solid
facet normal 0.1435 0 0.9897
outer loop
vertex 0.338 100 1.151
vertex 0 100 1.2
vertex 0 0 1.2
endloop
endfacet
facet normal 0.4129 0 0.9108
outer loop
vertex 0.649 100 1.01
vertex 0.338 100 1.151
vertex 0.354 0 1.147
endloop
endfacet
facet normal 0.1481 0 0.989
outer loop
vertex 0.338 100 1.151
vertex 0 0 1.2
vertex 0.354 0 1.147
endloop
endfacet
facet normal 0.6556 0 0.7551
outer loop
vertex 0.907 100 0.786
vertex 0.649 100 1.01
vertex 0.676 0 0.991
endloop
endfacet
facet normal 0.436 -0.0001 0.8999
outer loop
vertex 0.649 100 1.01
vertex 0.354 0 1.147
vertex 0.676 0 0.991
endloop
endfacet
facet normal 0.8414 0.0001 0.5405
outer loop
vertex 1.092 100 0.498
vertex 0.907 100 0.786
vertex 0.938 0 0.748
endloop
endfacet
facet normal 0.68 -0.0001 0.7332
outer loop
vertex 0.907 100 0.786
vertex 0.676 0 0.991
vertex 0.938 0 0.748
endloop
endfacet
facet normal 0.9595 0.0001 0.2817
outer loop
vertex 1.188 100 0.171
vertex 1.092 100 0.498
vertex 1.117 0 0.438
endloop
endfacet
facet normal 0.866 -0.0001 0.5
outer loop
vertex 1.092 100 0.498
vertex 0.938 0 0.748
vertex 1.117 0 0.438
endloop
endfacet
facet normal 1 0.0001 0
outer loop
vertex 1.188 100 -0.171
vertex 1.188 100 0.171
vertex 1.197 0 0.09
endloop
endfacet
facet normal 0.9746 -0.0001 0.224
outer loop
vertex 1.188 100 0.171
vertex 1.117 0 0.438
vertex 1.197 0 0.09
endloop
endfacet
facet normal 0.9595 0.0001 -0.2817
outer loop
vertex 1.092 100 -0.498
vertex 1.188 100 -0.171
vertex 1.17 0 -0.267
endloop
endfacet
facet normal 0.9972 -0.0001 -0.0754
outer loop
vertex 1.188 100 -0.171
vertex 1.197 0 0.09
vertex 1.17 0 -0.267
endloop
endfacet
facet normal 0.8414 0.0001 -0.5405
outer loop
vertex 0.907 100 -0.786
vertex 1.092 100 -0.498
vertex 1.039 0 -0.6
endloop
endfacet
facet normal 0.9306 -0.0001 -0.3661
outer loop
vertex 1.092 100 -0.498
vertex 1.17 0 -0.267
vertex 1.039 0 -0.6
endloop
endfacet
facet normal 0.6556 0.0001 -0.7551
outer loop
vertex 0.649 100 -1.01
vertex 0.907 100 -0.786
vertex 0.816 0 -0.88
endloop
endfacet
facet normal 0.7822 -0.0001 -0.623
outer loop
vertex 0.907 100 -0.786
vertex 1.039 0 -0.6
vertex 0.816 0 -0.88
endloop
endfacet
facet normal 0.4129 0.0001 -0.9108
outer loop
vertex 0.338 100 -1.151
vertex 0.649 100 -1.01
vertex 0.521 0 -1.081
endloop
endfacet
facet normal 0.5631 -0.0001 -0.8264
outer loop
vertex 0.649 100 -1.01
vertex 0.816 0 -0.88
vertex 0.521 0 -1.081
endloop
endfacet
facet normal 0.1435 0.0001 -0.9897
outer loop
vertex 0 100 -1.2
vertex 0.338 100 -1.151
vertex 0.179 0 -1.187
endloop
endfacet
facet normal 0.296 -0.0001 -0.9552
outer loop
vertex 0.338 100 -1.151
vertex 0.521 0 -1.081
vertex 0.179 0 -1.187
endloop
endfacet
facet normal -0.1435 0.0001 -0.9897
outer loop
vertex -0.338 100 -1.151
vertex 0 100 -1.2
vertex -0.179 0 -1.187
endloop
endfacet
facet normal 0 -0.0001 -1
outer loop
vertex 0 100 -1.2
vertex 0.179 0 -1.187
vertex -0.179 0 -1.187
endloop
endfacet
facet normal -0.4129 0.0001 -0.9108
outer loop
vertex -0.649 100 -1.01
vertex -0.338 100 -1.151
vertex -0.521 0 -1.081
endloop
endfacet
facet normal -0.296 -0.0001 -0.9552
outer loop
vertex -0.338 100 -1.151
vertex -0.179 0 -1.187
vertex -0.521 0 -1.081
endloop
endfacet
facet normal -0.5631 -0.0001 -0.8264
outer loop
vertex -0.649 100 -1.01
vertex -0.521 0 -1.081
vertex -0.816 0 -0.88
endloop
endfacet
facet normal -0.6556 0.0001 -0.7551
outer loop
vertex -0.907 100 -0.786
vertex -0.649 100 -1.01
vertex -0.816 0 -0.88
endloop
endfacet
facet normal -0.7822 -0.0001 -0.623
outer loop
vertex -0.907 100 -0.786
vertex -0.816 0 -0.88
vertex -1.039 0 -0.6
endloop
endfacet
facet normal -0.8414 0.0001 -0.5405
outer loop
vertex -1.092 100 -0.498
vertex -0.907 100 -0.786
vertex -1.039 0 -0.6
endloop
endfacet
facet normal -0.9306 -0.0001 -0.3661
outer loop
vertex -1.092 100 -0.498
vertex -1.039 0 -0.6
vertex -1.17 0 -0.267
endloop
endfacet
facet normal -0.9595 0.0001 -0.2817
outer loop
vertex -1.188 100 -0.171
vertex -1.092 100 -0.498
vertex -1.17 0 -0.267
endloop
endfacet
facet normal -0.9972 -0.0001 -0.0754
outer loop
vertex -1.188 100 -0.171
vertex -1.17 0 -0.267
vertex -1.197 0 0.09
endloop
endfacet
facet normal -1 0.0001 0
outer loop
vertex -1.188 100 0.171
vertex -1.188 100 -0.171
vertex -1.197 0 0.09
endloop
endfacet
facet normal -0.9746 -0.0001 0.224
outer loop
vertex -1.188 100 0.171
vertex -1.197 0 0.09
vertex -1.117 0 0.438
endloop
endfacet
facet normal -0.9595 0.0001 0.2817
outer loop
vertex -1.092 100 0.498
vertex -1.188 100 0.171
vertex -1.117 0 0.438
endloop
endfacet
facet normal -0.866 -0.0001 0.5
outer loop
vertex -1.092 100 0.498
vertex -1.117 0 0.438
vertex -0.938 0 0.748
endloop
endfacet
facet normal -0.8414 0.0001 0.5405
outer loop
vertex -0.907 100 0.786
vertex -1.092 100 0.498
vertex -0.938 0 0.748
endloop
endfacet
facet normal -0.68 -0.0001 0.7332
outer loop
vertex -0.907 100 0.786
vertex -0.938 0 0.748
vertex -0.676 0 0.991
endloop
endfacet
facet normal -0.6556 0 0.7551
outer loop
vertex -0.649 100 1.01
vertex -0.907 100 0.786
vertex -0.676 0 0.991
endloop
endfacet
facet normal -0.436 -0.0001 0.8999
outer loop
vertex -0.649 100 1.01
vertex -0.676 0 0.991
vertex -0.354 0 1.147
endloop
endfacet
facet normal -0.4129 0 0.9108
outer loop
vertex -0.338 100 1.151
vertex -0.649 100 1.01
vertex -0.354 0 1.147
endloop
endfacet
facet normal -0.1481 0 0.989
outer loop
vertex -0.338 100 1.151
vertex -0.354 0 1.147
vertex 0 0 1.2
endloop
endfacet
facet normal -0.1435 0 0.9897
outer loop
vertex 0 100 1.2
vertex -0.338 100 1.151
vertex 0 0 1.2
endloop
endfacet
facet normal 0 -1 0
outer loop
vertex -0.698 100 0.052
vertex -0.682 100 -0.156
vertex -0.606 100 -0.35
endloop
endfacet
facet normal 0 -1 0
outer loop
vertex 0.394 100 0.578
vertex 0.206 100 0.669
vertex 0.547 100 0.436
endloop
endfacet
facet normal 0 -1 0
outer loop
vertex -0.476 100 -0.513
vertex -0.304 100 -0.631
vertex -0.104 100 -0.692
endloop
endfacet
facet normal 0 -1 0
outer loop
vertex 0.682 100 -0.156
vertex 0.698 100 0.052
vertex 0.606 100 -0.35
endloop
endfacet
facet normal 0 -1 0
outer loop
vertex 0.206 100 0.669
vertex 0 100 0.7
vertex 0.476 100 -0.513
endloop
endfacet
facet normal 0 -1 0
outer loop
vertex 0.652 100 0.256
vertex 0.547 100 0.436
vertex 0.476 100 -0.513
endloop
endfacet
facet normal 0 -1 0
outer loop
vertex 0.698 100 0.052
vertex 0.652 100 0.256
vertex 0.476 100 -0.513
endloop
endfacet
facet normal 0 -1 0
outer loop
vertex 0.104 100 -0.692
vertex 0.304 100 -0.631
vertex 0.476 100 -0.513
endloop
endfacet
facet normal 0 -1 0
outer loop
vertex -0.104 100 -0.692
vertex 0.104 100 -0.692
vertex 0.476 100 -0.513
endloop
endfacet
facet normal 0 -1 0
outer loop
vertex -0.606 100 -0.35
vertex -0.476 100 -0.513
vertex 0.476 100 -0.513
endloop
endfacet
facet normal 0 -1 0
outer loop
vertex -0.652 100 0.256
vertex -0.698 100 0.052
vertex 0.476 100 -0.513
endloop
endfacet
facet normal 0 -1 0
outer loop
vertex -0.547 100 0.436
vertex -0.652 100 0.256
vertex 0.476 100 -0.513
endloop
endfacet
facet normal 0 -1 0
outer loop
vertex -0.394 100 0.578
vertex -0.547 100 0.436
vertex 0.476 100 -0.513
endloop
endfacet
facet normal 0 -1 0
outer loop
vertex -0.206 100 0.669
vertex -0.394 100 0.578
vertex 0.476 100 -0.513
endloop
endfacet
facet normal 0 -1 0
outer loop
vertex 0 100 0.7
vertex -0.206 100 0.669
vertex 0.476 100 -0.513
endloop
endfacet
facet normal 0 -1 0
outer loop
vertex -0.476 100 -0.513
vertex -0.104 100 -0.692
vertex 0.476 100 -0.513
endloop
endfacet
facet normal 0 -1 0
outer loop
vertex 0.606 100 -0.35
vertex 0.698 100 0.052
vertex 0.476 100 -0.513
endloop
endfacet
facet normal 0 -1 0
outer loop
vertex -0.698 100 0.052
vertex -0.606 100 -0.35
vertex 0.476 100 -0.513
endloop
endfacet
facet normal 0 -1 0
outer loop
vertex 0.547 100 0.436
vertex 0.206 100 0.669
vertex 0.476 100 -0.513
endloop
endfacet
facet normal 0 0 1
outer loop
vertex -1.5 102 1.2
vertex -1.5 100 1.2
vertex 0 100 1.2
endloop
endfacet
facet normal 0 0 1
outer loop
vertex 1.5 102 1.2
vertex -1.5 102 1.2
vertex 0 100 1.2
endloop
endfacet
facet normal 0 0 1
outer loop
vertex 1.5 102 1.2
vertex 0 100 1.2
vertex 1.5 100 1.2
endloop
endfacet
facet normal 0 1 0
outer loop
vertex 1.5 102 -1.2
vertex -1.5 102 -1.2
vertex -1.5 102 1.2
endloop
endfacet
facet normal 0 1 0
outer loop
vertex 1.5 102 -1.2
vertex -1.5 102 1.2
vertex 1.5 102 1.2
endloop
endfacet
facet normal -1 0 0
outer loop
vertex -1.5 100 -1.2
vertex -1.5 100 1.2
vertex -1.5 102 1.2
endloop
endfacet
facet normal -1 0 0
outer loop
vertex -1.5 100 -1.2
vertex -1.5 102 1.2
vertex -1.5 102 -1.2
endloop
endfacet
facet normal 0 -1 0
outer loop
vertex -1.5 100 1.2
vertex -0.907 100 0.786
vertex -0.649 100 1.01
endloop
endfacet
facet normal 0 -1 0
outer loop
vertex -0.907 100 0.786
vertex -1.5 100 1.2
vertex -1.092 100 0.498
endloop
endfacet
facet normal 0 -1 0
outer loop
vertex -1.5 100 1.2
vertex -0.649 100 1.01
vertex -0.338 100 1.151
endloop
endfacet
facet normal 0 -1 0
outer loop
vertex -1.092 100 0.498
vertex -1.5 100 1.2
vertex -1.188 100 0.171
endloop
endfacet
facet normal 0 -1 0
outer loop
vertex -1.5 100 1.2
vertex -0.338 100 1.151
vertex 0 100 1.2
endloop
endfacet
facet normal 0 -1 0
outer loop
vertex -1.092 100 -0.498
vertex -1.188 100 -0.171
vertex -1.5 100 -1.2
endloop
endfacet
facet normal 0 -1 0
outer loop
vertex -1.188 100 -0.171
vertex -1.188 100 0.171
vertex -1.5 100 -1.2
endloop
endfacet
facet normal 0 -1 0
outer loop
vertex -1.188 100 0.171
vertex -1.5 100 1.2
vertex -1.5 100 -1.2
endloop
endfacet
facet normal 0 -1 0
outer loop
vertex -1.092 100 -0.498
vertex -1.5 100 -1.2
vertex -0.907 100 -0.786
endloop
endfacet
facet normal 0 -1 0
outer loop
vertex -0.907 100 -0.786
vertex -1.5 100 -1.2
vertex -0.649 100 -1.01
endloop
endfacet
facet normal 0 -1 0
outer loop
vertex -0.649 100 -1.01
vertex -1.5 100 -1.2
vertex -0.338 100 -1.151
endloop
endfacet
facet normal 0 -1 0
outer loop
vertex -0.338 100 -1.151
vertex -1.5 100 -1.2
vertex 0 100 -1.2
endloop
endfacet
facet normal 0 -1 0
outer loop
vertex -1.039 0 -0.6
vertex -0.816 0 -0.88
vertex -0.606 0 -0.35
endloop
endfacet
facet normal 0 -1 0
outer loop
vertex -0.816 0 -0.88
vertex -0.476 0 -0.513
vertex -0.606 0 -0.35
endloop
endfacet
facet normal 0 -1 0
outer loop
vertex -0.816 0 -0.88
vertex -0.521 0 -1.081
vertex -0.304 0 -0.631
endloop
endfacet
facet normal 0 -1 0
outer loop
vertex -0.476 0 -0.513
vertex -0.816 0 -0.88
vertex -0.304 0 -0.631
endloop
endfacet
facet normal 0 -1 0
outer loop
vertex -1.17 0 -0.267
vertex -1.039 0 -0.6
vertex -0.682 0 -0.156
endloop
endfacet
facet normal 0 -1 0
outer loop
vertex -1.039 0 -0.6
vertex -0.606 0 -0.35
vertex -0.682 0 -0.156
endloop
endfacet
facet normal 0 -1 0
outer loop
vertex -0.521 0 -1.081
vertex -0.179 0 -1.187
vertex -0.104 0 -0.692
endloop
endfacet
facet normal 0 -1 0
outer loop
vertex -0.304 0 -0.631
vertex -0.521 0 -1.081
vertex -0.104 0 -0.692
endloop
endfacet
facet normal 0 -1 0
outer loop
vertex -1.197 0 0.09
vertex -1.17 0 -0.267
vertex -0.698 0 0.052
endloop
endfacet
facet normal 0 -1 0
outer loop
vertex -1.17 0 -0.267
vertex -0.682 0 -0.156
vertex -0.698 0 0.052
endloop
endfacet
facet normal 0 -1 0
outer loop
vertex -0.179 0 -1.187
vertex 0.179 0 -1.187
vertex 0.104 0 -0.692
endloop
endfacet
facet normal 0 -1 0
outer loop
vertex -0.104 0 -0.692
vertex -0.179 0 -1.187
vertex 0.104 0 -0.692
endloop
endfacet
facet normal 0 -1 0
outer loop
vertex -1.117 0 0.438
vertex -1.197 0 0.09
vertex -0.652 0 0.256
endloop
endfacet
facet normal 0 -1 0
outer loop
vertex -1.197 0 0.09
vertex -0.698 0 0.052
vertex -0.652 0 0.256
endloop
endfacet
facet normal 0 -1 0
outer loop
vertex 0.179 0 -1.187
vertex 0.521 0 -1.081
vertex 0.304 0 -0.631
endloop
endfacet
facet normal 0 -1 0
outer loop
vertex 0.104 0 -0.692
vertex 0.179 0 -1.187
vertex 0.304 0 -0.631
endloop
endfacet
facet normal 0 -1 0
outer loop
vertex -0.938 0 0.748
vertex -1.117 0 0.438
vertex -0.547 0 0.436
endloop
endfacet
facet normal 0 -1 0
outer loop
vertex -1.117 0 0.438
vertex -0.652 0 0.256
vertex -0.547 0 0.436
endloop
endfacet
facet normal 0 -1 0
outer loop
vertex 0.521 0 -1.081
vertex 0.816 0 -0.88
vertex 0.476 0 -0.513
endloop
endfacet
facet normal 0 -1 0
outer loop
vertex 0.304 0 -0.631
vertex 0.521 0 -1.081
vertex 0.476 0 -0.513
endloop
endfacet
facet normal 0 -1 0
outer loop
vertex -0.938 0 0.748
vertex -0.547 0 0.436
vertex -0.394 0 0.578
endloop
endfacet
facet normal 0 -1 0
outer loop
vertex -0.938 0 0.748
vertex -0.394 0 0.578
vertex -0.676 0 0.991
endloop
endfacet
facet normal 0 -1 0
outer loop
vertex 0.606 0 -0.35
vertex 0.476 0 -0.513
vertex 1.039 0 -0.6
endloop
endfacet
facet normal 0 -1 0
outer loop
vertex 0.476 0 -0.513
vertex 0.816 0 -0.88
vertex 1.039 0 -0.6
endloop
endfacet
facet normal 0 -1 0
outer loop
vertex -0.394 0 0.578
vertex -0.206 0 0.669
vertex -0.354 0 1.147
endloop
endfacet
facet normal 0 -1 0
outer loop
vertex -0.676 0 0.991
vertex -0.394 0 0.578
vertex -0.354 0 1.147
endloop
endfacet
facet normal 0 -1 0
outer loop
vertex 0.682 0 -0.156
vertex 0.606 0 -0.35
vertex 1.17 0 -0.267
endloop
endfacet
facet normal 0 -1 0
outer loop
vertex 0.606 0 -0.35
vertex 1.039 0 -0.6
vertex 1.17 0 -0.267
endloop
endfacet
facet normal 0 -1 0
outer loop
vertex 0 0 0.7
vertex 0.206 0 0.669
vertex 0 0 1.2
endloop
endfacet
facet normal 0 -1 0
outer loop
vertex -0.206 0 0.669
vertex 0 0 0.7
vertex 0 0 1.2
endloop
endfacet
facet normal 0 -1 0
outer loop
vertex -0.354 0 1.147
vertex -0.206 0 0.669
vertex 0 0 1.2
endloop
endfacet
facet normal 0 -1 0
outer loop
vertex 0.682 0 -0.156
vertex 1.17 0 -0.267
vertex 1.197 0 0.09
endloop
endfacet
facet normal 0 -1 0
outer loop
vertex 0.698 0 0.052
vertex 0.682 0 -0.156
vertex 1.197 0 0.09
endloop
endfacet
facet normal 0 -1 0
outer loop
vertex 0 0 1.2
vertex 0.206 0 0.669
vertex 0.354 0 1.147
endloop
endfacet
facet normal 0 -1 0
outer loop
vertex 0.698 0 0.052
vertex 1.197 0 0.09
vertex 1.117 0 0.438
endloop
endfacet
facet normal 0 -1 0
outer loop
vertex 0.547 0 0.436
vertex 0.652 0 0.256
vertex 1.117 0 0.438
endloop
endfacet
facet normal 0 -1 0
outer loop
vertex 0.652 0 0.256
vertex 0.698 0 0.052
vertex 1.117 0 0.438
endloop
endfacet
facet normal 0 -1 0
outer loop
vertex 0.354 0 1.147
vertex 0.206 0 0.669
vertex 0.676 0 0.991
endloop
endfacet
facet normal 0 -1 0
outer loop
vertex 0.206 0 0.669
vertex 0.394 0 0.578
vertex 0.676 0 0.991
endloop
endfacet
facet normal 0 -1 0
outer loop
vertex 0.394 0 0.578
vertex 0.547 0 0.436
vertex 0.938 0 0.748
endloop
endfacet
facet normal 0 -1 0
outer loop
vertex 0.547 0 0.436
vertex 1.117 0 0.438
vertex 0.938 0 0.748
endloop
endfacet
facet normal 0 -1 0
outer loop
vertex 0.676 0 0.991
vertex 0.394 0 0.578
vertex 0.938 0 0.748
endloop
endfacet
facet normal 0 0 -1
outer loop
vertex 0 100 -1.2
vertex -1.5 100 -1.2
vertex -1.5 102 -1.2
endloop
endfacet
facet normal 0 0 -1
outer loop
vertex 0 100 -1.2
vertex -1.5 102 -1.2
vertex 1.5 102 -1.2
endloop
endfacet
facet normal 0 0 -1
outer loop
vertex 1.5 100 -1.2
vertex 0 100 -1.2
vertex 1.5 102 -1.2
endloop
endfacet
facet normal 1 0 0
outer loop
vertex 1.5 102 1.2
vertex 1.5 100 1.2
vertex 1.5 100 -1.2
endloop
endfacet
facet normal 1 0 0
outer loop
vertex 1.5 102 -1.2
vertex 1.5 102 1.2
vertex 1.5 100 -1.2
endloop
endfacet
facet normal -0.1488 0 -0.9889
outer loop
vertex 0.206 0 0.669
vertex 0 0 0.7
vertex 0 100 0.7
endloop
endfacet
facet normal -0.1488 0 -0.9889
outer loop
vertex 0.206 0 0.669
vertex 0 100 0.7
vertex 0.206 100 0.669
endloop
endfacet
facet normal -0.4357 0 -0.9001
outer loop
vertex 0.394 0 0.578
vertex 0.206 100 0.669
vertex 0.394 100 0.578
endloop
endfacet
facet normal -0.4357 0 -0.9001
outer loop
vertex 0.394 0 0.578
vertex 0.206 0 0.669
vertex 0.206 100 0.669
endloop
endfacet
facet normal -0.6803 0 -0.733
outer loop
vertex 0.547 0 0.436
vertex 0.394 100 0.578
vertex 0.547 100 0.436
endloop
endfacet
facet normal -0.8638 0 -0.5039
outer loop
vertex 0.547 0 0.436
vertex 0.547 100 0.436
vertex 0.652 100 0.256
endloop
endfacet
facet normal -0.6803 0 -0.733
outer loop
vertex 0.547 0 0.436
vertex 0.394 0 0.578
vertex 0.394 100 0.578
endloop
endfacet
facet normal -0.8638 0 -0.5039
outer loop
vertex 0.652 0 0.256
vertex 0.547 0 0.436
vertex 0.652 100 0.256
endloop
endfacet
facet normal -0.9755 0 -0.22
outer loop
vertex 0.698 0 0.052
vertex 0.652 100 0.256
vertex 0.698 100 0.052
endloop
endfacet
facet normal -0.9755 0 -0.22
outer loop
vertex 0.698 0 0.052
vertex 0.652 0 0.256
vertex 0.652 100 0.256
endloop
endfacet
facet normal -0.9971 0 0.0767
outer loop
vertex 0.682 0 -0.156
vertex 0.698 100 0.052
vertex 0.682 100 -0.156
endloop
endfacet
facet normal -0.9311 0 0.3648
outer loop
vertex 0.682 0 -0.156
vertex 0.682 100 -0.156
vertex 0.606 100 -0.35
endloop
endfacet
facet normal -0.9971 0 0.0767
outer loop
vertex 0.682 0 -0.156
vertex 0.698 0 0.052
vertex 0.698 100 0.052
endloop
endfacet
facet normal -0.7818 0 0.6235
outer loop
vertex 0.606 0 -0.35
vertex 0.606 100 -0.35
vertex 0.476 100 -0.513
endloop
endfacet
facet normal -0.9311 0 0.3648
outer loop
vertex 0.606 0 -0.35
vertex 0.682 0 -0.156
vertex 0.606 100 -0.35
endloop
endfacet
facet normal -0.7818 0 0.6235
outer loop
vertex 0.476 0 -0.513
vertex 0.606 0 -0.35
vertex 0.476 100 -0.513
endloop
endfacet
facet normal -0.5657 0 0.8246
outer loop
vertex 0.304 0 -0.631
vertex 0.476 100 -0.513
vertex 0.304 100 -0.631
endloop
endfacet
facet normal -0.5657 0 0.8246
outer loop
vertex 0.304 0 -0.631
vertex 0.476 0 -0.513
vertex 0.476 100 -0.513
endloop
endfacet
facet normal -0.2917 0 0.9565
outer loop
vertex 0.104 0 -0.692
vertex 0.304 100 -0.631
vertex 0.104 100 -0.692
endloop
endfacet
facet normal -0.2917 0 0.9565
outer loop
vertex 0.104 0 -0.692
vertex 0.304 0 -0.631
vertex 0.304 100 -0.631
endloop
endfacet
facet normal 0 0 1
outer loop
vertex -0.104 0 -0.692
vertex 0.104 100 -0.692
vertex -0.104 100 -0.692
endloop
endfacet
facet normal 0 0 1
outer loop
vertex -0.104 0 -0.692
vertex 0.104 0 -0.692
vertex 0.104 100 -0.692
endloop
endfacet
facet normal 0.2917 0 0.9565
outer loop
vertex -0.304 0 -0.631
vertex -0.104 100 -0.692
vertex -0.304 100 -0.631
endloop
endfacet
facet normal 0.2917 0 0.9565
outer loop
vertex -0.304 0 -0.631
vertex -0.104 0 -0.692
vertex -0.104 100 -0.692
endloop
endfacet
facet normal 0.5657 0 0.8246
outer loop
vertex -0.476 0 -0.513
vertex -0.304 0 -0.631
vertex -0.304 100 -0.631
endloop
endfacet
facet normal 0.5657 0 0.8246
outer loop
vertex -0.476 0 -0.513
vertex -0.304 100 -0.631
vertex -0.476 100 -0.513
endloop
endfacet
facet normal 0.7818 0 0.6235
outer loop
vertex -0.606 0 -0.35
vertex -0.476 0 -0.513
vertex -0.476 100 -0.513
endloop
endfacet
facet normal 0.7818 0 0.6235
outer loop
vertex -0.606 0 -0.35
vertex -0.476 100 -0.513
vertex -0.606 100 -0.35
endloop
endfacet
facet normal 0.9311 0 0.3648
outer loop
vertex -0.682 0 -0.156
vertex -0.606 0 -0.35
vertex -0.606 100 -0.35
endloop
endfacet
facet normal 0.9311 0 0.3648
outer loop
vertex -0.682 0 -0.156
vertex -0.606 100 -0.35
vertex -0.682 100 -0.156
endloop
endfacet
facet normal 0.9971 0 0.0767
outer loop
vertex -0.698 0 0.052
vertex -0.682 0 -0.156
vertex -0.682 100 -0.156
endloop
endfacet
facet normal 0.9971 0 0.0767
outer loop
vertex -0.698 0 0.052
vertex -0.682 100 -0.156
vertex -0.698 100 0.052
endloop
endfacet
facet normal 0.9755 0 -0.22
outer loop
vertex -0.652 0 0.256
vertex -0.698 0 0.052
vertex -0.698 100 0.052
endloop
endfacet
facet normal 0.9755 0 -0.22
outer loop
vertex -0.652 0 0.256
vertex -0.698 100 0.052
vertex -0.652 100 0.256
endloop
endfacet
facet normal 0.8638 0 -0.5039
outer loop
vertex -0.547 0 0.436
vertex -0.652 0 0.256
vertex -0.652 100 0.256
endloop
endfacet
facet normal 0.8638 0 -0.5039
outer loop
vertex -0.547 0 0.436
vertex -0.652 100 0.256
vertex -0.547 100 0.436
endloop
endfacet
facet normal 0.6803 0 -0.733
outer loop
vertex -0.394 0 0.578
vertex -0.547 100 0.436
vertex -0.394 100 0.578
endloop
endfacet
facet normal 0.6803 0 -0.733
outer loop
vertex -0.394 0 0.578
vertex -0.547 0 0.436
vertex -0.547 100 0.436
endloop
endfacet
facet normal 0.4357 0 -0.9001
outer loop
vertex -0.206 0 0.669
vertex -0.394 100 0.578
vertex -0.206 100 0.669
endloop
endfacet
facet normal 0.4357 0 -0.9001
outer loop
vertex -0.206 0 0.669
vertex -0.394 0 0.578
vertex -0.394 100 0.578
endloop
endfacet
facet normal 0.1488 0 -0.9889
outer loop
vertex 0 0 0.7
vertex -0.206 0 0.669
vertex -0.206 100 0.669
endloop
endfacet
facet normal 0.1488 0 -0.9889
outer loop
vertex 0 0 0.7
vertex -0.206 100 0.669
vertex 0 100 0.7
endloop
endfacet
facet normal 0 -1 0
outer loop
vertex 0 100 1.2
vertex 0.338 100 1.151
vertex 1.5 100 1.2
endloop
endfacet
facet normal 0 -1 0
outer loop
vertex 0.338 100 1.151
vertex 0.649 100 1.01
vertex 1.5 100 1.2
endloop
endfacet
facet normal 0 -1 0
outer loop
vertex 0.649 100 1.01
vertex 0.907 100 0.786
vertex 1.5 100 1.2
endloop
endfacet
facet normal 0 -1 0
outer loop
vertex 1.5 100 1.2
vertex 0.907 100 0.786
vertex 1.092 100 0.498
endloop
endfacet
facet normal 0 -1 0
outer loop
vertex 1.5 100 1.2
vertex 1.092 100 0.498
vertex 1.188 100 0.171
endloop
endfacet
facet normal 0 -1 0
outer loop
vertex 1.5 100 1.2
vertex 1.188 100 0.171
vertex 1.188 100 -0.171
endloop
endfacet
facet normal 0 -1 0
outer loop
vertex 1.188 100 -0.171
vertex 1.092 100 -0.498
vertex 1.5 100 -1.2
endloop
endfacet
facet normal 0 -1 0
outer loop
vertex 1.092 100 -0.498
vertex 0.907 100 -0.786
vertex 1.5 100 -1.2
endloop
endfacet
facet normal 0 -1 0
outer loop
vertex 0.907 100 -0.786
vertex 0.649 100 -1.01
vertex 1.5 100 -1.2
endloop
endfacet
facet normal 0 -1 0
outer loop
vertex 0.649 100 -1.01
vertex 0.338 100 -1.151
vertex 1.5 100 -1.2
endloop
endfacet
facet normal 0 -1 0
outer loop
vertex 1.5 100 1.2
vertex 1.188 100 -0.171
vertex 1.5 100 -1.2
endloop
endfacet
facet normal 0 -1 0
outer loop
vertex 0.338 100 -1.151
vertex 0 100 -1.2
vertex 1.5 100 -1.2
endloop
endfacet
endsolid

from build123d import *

# Parameters (mm, degrees)
SKETCH_2_R      = 1.2
SKETCH_2_R_2    = 0.7
EXTRUDE_1_DEPTH = 100
SKETCH_3_W      = 3
SKETCH_3_H      = 2.4
EXTRUDE_2_DEPTH = 2


with BuildPart() as part:
    # 草图2 → 凸台-拉伸1 (new body)
    with BuildSketch(Plane(origin=(0, 0, 0), x_dir=(1, 0, 0), z_dir=(0, 1, 0))):
        with Locations(Location((0, 0, 0), (0, 0, 270))):
            Circle(SKETCH_2_R)
        with Locations(Location((0, 0, 0), (0, 0, 270))):
            Circle(SKETCH_2_R_2, mode=Mode.SUBTRACT)
    extrude(amount=EXTRUDE_1_DEPTH)

    # 草图3 → 凸台-拉伸2 (add)
    with BuildSketch(Plane(origin=(0, 100, 0), x_dir=(1, 0, 0), z_dir=(0, 1, 0))):
        Rectangle(SKETCH_3_W, SKETCH_3_H)
    extrude(amount=EXTRUDE_2_DEPTH)


solid = part.part
